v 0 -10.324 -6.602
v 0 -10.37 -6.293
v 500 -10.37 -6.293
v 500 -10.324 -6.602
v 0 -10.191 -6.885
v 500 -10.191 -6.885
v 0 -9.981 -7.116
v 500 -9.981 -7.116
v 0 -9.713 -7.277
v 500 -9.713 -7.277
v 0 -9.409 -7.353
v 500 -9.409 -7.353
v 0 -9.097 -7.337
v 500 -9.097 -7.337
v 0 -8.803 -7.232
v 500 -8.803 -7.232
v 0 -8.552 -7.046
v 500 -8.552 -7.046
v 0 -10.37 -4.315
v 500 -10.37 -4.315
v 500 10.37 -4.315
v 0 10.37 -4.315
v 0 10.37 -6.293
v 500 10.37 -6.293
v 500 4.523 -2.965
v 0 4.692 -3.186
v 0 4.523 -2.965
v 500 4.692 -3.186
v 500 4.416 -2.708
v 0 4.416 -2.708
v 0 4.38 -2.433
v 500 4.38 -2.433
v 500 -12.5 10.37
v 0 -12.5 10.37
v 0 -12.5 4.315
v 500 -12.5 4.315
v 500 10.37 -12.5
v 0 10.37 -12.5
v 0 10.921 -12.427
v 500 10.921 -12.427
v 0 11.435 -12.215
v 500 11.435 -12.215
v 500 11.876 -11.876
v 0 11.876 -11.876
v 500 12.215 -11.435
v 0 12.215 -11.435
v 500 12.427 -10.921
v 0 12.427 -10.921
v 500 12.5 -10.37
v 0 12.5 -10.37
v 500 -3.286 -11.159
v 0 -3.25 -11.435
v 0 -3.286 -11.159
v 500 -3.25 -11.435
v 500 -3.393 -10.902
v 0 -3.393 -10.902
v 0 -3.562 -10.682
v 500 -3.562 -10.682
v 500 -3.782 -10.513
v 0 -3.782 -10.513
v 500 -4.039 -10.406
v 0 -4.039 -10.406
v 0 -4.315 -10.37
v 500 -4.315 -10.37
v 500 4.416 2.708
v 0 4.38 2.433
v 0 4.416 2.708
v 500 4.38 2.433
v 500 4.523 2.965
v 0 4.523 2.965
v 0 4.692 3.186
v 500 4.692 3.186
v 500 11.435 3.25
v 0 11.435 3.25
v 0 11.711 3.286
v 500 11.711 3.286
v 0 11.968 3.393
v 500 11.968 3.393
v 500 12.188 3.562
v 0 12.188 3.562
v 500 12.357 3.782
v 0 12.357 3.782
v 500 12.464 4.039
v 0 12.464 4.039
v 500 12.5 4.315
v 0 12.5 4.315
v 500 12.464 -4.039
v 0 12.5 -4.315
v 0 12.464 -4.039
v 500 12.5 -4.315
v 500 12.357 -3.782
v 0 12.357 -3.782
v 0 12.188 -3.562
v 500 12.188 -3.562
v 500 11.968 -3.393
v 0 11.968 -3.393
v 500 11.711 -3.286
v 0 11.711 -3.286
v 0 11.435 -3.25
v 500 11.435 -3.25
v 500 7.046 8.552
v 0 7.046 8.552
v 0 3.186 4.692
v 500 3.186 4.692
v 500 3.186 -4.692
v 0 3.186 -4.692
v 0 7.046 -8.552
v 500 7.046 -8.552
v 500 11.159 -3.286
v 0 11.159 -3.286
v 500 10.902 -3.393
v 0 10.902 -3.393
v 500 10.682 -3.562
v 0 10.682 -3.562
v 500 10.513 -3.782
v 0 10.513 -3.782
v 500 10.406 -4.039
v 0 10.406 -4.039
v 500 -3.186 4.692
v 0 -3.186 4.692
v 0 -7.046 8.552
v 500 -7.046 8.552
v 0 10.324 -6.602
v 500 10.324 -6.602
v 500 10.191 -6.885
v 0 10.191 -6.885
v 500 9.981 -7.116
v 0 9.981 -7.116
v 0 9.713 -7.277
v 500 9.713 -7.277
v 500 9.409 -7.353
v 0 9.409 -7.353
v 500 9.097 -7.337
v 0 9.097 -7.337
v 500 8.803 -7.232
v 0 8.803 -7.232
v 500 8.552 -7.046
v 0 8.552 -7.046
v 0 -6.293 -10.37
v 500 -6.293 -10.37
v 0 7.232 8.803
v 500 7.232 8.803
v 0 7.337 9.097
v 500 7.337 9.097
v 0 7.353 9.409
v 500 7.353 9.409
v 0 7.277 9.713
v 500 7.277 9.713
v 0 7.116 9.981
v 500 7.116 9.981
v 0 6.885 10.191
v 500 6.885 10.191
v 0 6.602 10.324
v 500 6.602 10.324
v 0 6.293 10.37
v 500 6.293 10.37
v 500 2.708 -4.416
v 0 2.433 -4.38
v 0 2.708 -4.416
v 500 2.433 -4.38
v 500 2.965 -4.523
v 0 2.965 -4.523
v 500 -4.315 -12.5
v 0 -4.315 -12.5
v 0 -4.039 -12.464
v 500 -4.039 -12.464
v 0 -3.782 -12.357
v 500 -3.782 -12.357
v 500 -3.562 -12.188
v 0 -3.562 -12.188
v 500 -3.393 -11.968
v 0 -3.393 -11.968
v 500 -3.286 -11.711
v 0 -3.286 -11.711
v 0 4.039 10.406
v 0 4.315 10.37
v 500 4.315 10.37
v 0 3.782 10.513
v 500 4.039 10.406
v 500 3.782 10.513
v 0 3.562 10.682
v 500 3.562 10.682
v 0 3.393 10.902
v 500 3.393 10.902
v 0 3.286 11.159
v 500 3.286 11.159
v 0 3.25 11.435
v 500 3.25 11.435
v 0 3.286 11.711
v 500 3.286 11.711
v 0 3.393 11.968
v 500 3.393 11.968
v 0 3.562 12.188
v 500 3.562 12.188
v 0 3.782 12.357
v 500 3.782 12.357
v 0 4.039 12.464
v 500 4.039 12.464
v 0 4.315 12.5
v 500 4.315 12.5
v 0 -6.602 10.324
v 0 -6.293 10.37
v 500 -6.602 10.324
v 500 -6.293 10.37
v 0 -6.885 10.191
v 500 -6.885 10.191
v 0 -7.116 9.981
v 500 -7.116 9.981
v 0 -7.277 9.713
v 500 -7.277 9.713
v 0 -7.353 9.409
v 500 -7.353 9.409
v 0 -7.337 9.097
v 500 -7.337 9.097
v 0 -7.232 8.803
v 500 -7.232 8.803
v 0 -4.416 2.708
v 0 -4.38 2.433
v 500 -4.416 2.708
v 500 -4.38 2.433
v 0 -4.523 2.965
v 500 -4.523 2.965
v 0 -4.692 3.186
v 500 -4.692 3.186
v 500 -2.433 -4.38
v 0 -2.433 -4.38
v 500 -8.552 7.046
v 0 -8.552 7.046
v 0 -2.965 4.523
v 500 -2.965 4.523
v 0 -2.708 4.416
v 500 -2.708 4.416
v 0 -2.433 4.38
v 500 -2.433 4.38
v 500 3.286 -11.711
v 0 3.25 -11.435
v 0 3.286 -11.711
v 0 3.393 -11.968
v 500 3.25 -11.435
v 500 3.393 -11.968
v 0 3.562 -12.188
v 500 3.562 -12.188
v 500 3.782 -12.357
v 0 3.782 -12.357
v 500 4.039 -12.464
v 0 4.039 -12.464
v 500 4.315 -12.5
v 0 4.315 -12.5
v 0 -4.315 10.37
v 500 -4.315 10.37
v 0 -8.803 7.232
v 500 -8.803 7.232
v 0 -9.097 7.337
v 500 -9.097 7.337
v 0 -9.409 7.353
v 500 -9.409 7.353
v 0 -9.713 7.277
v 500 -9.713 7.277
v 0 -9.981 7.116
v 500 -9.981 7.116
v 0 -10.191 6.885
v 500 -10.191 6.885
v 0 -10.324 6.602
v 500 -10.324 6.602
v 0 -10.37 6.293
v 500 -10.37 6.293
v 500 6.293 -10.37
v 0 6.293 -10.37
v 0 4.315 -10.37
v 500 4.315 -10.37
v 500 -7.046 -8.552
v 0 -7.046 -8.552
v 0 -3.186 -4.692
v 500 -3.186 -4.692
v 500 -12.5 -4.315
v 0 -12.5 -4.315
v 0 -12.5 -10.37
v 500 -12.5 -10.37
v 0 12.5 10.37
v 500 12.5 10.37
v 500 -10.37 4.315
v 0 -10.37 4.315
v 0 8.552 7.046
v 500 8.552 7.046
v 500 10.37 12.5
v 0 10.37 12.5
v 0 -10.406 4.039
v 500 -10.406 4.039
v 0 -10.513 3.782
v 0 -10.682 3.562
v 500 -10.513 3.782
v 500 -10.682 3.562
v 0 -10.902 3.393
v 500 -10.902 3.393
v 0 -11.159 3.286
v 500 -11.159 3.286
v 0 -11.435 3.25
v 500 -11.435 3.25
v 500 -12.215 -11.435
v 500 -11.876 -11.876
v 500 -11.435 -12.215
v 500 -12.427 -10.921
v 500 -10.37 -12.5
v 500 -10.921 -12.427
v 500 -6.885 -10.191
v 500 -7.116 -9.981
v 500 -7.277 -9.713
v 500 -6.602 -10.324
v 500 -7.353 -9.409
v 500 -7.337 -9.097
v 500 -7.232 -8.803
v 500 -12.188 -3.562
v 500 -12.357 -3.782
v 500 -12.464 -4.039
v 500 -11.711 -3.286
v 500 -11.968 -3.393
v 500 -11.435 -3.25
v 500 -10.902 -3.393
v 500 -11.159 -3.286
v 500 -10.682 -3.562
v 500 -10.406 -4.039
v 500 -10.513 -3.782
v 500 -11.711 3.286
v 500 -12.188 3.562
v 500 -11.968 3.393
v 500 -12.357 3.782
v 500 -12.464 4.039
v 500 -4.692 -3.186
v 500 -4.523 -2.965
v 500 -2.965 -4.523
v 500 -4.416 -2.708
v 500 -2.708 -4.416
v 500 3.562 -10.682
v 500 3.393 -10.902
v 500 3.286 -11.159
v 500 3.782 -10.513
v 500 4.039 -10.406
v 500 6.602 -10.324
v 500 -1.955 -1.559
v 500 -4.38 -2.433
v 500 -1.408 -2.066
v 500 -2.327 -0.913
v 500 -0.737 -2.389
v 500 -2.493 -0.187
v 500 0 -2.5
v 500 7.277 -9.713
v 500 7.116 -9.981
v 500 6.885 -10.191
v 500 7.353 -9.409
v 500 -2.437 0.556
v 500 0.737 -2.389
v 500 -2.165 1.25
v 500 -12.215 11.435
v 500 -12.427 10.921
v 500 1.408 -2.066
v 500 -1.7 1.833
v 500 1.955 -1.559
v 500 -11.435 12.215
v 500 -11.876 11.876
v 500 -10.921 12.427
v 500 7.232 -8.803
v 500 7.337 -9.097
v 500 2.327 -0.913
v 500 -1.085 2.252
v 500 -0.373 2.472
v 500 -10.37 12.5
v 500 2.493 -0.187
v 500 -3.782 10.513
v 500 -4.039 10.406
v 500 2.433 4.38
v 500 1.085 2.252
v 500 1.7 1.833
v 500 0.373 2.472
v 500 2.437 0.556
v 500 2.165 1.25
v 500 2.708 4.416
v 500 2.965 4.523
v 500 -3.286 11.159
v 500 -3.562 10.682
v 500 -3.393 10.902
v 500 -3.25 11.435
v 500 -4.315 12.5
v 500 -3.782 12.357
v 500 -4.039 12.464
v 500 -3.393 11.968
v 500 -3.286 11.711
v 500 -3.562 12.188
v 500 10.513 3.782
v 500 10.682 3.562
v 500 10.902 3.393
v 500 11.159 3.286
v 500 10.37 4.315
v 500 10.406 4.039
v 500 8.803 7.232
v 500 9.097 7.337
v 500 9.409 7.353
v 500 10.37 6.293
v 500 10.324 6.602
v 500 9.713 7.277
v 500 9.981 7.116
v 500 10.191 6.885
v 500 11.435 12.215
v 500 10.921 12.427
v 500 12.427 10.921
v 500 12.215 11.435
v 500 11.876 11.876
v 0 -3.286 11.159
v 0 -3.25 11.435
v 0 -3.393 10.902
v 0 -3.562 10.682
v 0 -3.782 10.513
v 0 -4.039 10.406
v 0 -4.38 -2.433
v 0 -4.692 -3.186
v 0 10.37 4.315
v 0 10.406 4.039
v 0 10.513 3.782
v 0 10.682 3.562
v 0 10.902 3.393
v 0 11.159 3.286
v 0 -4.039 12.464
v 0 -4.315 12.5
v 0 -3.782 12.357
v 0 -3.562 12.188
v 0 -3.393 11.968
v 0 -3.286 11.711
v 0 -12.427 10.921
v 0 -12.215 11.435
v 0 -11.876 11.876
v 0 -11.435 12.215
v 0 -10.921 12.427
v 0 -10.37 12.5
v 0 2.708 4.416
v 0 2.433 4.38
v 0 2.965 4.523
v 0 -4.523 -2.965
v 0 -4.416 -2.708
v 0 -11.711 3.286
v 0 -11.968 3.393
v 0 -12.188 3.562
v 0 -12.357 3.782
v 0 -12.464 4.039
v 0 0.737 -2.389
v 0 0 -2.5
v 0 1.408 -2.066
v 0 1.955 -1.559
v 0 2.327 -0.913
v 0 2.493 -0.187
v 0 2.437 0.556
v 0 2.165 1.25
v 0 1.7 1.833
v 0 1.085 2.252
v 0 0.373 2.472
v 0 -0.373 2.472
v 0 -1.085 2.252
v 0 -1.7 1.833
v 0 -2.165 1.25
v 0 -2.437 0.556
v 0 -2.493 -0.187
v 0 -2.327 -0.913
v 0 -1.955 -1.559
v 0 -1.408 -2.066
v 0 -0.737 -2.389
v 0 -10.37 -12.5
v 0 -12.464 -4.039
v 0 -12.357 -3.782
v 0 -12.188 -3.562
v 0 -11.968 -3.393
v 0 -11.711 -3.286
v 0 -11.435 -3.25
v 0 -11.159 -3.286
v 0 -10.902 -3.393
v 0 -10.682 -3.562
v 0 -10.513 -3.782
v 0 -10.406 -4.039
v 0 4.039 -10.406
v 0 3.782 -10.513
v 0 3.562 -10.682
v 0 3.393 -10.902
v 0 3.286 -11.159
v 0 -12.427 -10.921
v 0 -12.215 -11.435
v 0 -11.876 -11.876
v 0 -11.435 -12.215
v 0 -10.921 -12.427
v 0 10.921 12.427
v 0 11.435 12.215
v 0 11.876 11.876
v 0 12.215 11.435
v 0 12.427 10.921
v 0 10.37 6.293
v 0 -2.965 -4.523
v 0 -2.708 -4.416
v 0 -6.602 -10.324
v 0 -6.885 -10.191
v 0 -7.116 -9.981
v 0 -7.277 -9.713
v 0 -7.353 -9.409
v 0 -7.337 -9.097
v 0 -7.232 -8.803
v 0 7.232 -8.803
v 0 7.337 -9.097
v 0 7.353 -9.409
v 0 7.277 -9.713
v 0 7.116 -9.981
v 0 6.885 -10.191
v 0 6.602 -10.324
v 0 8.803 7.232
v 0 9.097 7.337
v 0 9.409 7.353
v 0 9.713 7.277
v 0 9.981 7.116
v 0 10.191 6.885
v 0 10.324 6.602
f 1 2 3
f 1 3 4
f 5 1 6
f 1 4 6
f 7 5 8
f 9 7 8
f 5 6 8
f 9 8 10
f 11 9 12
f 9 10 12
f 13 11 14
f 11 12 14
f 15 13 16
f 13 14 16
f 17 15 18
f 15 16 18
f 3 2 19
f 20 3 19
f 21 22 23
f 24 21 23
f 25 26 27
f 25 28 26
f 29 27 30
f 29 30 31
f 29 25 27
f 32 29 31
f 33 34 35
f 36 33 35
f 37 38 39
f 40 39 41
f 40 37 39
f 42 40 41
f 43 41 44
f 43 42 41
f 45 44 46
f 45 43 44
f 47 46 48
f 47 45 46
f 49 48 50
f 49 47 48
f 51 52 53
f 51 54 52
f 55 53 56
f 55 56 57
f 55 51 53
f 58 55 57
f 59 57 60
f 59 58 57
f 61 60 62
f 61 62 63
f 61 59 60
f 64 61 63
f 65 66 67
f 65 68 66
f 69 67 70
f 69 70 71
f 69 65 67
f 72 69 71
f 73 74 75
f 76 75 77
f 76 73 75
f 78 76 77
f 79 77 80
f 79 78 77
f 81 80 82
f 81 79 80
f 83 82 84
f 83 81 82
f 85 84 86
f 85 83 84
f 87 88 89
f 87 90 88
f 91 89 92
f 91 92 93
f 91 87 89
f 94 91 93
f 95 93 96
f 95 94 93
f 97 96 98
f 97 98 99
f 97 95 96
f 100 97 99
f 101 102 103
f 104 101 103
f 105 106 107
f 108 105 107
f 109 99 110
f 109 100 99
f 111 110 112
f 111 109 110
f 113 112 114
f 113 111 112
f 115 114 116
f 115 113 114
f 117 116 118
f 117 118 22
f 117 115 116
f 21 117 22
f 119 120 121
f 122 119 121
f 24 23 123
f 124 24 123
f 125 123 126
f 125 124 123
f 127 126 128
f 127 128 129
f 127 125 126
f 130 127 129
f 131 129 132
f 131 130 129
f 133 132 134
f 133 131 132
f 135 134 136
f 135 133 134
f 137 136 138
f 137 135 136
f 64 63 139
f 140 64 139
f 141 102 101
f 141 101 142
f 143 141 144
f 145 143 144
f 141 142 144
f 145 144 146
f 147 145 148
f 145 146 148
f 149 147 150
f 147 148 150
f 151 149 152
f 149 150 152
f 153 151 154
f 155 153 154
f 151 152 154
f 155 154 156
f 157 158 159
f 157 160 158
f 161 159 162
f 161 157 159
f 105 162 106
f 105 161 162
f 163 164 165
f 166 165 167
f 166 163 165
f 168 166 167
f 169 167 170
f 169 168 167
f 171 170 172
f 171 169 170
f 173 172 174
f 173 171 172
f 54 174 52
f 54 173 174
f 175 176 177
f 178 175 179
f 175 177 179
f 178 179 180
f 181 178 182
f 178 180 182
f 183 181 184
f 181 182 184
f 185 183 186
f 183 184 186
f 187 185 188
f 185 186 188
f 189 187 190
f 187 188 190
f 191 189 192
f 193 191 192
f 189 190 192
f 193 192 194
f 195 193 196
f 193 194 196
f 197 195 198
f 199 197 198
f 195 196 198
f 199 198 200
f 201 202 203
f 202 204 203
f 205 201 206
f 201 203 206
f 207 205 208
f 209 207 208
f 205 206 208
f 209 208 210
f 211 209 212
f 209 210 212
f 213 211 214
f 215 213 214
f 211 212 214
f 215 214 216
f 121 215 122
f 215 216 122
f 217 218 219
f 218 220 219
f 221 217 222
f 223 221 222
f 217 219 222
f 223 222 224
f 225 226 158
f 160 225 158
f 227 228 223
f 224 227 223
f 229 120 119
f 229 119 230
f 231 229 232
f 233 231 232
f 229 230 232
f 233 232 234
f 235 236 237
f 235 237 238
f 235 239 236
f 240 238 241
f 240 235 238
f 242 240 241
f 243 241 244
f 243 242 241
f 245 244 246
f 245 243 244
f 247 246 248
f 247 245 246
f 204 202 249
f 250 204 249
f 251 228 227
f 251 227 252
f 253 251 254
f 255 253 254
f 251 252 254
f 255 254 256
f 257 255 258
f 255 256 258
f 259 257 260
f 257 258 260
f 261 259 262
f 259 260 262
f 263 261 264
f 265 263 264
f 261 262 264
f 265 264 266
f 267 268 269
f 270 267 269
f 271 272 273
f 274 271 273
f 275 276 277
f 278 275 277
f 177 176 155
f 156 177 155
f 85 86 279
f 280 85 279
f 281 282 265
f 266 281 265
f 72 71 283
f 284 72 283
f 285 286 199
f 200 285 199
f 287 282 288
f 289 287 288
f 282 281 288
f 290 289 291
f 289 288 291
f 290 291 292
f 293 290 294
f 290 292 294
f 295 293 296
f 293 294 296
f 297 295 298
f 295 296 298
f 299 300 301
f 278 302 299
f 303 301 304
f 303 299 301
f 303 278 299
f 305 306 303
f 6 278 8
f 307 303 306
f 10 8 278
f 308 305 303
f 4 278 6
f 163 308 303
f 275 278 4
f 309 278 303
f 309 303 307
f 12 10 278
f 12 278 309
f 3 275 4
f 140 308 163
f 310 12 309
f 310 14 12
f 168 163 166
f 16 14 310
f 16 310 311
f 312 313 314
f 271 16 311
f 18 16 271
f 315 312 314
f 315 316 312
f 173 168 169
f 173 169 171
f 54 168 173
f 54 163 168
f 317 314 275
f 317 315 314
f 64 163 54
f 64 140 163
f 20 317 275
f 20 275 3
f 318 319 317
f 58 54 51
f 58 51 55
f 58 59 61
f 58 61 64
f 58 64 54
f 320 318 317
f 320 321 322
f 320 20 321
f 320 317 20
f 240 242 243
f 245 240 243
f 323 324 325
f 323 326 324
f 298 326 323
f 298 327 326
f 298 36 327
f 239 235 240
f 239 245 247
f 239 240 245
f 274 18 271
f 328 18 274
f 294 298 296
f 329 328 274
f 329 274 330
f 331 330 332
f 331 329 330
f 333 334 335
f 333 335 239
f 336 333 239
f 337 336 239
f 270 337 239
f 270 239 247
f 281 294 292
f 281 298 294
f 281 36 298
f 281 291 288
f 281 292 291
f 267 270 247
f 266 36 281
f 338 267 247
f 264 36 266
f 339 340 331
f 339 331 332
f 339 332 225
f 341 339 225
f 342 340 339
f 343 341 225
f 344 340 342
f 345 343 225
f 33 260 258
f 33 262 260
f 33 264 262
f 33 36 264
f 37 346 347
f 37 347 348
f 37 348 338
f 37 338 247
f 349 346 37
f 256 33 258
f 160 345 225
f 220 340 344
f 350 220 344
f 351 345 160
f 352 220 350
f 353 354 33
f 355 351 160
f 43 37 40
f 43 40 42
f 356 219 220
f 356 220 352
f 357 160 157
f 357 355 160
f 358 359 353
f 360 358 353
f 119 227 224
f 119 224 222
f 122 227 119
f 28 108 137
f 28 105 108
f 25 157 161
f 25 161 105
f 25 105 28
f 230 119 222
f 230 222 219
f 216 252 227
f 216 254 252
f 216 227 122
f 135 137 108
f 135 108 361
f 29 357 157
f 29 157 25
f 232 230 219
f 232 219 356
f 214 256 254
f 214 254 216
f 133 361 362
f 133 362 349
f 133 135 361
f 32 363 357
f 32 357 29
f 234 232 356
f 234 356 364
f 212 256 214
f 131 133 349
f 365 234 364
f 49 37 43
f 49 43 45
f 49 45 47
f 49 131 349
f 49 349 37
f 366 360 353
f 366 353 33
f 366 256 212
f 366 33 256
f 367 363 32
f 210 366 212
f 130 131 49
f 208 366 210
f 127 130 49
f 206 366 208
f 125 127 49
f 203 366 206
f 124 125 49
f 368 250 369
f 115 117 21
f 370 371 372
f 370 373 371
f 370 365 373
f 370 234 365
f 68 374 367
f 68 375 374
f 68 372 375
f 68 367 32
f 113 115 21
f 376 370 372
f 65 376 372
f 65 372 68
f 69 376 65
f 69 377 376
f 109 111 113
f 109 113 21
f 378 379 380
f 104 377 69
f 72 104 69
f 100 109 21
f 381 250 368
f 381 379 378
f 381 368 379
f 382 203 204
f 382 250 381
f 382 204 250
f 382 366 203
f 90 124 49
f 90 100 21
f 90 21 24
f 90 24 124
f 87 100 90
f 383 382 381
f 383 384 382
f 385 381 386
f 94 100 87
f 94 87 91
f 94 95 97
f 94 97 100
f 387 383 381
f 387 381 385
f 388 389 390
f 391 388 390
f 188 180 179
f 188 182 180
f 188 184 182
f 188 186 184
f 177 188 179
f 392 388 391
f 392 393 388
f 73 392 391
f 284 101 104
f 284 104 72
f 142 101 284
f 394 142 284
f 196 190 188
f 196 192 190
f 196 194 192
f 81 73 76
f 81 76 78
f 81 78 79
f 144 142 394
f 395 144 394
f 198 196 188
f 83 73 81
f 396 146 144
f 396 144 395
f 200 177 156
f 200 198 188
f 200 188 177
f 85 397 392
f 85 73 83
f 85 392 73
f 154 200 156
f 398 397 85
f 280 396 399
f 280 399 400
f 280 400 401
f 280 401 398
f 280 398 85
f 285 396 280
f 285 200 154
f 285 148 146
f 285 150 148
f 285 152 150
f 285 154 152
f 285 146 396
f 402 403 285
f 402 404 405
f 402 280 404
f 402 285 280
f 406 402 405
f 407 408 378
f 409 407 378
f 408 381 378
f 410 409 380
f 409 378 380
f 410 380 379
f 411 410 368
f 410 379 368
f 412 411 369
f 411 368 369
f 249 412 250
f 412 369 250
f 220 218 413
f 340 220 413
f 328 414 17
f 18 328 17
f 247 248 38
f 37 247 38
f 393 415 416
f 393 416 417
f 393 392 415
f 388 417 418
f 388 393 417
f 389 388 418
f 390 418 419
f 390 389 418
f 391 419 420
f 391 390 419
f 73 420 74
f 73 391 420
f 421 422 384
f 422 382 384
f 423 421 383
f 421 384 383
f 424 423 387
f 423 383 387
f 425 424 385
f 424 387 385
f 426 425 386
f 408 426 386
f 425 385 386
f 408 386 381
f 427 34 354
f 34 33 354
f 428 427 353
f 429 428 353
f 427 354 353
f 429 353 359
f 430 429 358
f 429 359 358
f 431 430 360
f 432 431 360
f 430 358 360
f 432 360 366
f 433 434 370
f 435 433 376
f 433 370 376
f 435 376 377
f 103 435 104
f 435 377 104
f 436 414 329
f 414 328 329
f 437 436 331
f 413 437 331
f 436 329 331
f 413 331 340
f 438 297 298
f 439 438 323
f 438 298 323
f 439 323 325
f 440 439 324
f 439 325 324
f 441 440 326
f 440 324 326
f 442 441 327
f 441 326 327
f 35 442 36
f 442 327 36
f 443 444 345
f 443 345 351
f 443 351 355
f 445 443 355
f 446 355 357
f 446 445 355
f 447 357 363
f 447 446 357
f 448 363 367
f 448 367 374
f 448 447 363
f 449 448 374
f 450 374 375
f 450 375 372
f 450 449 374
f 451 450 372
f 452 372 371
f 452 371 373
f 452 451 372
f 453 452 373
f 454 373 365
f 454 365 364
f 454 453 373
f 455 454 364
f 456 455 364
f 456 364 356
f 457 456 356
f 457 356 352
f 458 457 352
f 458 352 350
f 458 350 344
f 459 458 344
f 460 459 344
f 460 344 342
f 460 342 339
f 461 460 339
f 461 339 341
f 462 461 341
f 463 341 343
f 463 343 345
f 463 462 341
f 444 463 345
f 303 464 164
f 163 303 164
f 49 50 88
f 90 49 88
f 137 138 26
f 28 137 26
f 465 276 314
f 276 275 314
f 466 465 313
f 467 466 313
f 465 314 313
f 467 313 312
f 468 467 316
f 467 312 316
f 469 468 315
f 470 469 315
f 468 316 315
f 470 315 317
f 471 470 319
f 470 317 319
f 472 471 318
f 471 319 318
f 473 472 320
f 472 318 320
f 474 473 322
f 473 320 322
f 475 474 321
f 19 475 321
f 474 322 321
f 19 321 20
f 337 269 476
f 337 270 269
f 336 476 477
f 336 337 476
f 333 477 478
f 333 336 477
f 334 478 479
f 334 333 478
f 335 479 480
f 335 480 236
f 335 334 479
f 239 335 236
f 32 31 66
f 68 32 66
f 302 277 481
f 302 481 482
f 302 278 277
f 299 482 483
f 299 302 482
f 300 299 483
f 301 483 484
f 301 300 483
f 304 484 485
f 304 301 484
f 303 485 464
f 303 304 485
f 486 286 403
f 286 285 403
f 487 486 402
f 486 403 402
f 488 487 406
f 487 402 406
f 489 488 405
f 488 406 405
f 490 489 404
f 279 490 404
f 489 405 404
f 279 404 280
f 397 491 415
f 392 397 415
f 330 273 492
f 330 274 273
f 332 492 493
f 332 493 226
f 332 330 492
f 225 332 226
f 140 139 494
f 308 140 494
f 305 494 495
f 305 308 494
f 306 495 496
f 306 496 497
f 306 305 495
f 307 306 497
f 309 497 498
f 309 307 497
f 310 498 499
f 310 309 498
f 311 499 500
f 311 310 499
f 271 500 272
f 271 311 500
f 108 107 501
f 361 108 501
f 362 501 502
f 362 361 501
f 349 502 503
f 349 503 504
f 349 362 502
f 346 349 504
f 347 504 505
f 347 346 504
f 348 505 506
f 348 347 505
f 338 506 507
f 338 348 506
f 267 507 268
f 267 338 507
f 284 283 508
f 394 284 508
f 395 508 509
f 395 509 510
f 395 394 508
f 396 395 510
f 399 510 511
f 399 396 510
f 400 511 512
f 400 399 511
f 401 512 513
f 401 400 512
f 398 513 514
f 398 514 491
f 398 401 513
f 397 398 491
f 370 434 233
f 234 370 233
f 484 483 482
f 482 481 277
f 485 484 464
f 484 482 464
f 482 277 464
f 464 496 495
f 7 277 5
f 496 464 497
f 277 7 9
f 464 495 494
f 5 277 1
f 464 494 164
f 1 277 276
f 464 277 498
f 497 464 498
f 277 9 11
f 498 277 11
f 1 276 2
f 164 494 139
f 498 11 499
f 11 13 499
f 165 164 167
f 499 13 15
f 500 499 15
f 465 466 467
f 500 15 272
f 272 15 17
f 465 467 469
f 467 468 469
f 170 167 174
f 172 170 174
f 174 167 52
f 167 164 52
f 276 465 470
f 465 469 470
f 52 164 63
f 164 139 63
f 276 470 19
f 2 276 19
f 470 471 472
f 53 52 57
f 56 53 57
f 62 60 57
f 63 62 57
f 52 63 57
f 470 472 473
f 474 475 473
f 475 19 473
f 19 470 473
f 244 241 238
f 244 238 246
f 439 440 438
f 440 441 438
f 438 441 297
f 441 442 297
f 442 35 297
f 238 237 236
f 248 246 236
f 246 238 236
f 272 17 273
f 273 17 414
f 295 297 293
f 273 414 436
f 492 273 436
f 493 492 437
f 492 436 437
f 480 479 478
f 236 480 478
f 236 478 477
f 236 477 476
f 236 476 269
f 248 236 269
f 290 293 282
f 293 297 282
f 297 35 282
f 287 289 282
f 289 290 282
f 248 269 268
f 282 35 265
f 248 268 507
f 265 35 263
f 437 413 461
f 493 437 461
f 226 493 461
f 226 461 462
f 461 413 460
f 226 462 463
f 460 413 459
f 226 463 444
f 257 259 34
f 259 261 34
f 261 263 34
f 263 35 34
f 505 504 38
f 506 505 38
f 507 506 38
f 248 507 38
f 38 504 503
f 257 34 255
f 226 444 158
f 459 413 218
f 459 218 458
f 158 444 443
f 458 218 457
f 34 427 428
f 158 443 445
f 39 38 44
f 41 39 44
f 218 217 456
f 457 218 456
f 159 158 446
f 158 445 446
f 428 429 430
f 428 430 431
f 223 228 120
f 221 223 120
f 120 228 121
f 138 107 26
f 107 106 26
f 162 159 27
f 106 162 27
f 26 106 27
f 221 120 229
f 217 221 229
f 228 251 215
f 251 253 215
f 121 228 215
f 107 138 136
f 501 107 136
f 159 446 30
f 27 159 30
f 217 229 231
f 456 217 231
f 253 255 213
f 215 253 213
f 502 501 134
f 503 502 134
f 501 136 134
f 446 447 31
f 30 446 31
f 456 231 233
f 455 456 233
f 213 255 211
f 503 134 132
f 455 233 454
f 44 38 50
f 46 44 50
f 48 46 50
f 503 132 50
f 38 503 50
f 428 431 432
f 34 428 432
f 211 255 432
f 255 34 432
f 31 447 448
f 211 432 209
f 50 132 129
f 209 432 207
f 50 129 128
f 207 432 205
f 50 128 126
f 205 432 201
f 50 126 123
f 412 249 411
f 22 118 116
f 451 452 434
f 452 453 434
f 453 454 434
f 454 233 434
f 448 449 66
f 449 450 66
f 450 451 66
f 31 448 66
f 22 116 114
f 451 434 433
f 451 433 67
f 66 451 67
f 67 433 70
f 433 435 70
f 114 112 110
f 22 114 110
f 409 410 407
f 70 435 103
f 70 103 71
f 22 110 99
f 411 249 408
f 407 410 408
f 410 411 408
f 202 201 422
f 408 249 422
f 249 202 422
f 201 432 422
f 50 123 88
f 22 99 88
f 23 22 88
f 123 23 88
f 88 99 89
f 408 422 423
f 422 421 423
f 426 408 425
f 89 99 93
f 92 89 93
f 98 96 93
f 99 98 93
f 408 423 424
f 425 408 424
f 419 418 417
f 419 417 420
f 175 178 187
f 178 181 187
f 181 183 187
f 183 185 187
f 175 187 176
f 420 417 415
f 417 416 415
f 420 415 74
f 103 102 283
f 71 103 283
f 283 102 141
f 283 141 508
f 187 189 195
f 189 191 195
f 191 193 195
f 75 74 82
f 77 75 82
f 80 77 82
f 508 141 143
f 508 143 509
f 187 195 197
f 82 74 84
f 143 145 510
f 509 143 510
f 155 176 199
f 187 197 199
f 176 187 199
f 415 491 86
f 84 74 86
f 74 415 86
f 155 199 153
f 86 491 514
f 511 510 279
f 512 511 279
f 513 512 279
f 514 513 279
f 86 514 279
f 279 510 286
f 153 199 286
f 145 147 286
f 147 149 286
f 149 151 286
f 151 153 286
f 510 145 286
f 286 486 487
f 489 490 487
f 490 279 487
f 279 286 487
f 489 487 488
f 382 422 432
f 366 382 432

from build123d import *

# Parameters (mm, degrees)
SKETCH1_R           = 2.5
BOSS_EXTRUDE1_DEPTH = 500
FILLET1_R           = 1.065
FILLET2_R           = 2.13


with BuildPart() as part:
    # Sketch1 → Boss-Extrude1 (new body)
    with BuildSketch(Plane.YZ):
        Polygon((-12.5, -3.25), (-12.5, -12.5), (-3.25, -12.5), (-3.25, -10.37), (-8.863862556, -10.37), (-2.873862556, -4.38), (2.873862556, -4.38), (8.863862556, -10.37), (3.25, -10.37), (3.25, -12.5), (12.5, -12.5), (12.5, -3.25), (10.37, -3.25), (10.37, -8.863862556), (4.38, -2.873862556), (4.38, 2.873862556), (10.37, 8.863862556), (10.37, 3.25), (12.5, 3.25), (12.5, 12.5), (3.25, 12.5), (3.25, 10.37), (8.863862556, 10.37), (2.873862556, 4.38), (-2.873862556, 4.38), (-8.863862556, 10.37), (-3.25, 10.37), (-3.25, 12.5), (-12.5, 12.5), (-12.5, 3.25), (-10.37, 3.25), (-10.37, 8.863862556), (-4.38, 2.873862556), (-4.38, -2.873862556), (-10.37, -8.863862556), (-10.37, -3.25), align=None)
        with Locations(Location((0, 0, 0), (0, 0, 270))):
            Circle(SKETCH1_R, mode=Mode.SUBTRACT)
    extrude(amount=BOSS_EXTRUDE1_DEPTH)

    # Fillet1
    fillet1_edges = [part.edges().sort_by_distance(p)[0] for p in [
        (250, -10.37, -8.863862556),
        (250, 2.873862556, -4.38),
        (250, -2.873862556, -4.38),
        (250, -4.38, 2.873862556),
        (250, -4.38, -2.873862556),
        (250, -2.873862556, 4.38),
        (250, 2.873862556, 4.38),
        (250, 4.38, 2.873862556),
        (250, 4.38, -2.873862556),
        (250, -8.863862556, -10.37),
        (250, 8.863862556, -10.37),
        (250, 10.37, -8.863862556),
        (250, -10.37, 8.863862556),
        (250, -8.863862556, 10.37),
        (250, 10.37, 8.863862556),
        (250, 8.863862556, 10.37),
        (250, 12.5, 3.25),
        (250, -3.25, -12.5),
        (250, -10.37, 3.25),
        (250, 10.37, 3.25),
        (250, -10.37, -3.25),
        (250, -12.5, -3.25),
        (250, -12.5, 3.25),
        (250, 3.25, -10.37),
        (250, -3.25, -10.37),
        (250, 3.25, -12.5),
        (250, 10.37, -3.25),
        (250, 12.5, -3.25),
        (250, 3.25, 12.5),
        (250, 3.25, 10.37),
        (250, -3.25, 10.37),
        (250, -3.25, 12.5),
    ]]
    fillet(fillet1_edges, radius=FILLET1_R - 0.0001)  # a hair under: the kernel refuses the full size

    # Fillet2
    fillet2_edges = [part.edges().sort_by_distance(p)[0] for p in [
        (250, -12.5, 12.5),
        (250, 12.5, 12.5),
        (250, 12.5, -12.5),
        (250, -12.5, -12.5),
    ]]
    fillet(fillet2_edges, radius=FILLET2_R)


solid = part.part
